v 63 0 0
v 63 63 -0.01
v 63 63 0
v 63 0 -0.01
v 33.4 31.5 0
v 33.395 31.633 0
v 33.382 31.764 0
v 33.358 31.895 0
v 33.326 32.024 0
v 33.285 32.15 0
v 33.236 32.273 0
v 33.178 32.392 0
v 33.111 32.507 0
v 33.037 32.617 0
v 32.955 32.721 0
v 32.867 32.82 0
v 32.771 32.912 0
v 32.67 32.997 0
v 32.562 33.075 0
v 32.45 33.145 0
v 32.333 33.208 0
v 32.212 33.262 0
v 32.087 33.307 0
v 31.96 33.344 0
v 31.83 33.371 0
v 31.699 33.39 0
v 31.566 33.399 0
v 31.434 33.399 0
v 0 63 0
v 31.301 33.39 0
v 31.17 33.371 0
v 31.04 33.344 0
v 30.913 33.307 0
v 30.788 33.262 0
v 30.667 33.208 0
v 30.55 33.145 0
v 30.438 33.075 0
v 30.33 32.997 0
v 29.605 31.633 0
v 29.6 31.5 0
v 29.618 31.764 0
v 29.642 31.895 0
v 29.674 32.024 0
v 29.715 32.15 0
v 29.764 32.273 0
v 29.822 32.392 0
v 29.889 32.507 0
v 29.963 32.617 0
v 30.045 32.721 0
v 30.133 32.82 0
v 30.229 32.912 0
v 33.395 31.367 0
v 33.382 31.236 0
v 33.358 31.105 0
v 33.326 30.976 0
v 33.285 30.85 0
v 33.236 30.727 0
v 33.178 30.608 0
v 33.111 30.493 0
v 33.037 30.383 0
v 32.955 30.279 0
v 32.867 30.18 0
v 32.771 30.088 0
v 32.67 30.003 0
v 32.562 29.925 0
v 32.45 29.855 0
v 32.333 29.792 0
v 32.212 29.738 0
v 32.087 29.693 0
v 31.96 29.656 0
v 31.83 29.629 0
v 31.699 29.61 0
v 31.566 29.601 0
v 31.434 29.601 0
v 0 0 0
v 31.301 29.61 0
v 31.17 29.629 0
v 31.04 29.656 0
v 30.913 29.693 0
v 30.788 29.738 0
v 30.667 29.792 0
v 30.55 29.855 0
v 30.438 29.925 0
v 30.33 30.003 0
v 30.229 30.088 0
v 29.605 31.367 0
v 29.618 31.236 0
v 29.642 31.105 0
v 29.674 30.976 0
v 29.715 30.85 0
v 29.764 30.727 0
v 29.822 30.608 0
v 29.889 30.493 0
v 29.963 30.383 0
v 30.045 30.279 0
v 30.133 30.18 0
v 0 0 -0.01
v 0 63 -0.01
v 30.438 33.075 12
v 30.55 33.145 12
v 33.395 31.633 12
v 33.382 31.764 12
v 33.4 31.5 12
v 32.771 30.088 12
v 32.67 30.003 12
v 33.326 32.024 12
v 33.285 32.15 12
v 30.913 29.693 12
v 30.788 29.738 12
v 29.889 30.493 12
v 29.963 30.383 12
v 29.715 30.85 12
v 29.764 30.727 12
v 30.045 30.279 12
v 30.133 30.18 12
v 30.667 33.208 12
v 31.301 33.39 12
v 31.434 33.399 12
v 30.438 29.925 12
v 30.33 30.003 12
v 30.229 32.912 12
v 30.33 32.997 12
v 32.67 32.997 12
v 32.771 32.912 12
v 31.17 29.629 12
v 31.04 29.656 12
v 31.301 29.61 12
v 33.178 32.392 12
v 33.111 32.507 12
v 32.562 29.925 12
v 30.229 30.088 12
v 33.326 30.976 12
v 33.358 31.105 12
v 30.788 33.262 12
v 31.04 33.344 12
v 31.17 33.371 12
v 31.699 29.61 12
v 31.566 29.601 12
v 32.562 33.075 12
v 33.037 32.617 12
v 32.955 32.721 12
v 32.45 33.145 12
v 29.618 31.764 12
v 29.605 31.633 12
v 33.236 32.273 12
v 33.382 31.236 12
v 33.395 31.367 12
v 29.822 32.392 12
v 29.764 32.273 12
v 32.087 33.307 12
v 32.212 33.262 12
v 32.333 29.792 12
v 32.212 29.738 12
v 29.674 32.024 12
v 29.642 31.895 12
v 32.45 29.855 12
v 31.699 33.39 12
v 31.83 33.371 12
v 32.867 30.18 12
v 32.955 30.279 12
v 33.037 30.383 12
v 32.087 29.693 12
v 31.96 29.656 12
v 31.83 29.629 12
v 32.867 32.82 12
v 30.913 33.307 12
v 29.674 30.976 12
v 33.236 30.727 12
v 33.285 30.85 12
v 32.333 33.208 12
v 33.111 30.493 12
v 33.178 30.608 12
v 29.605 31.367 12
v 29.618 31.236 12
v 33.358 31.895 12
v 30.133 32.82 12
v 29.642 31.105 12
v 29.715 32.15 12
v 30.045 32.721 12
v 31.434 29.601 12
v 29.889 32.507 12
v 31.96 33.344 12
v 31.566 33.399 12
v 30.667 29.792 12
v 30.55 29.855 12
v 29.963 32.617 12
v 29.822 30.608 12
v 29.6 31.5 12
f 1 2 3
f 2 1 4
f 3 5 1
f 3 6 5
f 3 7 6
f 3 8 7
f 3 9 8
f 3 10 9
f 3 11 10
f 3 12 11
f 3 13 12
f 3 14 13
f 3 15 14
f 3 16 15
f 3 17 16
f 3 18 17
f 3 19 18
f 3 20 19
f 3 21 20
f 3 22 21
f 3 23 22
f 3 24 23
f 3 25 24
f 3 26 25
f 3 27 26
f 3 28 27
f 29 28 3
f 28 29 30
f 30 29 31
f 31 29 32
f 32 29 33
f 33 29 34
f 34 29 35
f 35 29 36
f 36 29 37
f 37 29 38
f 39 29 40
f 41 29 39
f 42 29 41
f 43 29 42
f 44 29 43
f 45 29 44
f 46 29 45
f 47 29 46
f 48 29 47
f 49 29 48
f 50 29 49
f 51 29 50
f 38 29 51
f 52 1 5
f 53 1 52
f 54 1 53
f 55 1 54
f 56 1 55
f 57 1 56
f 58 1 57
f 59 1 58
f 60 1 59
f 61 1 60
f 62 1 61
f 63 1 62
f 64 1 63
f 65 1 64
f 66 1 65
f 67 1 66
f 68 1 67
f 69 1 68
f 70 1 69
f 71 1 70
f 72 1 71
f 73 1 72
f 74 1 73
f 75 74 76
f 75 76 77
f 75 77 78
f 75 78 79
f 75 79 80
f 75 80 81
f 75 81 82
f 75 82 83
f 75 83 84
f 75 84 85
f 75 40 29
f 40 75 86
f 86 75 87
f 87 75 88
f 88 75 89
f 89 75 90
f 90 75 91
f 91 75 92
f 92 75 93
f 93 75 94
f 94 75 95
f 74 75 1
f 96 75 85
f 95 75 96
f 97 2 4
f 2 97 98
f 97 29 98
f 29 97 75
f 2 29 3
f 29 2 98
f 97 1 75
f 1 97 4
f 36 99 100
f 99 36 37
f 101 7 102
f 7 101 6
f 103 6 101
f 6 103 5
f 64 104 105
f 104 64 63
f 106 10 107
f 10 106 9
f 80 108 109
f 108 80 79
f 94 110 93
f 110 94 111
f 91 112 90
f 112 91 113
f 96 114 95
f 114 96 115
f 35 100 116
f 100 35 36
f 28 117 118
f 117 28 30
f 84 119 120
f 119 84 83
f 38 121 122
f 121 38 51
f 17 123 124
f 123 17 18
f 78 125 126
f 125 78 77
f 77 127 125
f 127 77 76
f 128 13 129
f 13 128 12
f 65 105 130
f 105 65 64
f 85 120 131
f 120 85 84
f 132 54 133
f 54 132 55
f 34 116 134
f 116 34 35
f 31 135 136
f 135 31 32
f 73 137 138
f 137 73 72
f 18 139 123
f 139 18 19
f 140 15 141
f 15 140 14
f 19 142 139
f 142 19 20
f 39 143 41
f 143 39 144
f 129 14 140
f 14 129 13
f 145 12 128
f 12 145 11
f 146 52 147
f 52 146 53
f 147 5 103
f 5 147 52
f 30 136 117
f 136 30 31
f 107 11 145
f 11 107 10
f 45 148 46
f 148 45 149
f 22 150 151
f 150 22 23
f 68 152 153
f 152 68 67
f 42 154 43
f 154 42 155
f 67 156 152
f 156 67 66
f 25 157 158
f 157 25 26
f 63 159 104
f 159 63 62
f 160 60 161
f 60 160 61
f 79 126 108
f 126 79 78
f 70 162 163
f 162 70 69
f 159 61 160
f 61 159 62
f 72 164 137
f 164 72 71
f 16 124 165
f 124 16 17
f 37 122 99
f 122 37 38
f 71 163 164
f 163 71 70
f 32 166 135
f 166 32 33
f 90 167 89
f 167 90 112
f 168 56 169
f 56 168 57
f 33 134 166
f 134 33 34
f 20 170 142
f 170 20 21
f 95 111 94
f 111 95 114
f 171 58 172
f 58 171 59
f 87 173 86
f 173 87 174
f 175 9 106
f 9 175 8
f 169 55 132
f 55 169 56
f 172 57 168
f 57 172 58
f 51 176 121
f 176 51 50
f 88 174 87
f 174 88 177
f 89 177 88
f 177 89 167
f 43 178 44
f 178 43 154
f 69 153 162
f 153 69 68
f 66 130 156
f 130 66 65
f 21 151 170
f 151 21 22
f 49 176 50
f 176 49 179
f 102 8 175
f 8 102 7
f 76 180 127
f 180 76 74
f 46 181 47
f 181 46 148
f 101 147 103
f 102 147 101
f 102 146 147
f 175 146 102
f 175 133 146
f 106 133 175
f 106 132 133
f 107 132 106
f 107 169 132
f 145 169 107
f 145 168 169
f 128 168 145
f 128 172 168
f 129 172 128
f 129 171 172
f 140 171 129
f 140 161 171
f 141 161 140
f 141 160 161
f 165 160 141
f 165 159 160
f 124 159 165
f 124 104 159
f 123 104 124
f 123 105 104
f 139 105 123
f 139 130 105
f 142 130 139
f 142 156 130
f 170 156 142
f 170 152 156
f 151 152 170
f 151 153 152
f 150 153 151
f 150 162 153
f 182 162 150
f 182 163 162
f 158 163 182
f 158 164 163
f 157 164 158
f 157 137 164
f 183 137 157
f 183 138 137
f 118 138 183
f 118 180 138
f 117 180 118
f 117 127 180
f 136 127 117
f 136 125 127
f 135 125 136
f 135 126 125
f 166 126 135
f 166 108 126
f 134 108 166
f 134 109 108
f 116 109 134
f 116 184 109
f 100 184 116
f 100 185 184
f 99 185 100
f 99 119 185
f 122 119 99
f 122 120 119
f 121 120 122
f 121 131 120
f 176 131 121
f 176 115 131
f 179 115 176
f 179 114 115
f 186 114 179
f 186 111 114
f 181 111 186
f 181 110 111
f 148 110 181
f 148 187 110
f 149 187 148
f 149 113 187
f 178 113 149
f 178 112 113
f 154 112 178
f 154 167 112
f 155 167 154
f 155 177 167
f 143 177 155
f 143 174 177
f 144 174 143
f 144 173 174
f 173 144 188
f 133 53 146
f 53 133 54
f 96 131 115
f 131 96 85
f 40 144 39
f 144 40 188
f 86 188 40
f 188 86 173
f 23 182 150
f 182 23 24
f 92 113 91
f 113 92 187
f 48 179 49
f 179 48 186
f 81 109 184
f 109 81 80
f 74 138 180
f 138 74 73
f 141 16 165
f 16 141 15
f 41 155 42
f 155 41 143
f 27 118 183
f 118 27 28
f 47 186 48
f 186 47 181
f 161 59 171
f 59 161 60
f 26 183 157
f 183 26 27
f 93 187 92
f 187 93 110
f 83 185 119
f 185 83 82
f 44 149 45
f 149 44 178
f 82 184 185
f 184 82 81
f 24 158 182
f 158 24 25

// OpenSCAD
// file: ../Base/Rotation.scad
// Fischertechnik Box Foundation
// Geometry Helpers Rotation

include <PlacementOptions.scad>

// getRotatedSpace(space, rotation=NoRotation)
// Rotates the space dependent on the specified rotation

function getRotatedSpace(space, rotation=NoRotation) = [
    (rotation == Rotate90 || rotation == Rotate270) ? space.y : space.x,
    (rotation == Rotate90 || rotation == Rotate270) ? space.x : space.y
];

// Rotates the given space around the fixed left lower corner
// space = the space the children needs as width/depth list [width,depth]
// rotation = 0 Rotate0 degrees, 1 Rotate90 degrees, 2 Rotate180 degrees, 3 Rotate270 degrees (equivalent to -90)

module RotateFix(space, rotation=NoRotation) {
    dy = (rotation == Rotate0 || rotation == Rotate270) ? 0 :
        (rotation == Rotate90) ? space.x :
        space.y;
    dx = (rotation < Rotate180) ? 0 :
        (rotation == Rotate180) ? space.x :
        space.y;
    
    translate([dx, dy, 0])
        rotate([0, 0, rotations[rotation]])
            children();
}
// file: ../Base/Alignment.scad
// Fischertechnik Box Foundation
// Geometry Helpers Alignment

include <PlacementOptions.scad>

// getAlignedX(elementWidth, spaceWidth, align=AlignRight, offset=0)
// Gets the aligned X offset of an element with the given
// width in the given space.
// elementWidth = The width of the element to positon
// spaceWidth = The space where the element should be aligned
// align = 0 AlignLeft, 1 AlignCenter, 2 AlignRight
// offset = an optional offset from the aligned position. When
// aligned left or centered, then positive values are in X direction.
// When aligned right then positive values are in negative X direction.

function getAlignedX(elementWidth, spaceWidth, align=AlignRight, offset=0) =
    (align == AlignLeft) ?
        offset :
        ((align == AlignCenter) ?
        (spaceWidth - elementWidth)/2 + offset :
        spaceWidth - offset - elementWidth);

// getAlignedY(elementDepth, spaceDepth, align=AlignTop, offset=0)
// Gets the aligned Y offset of an element with the given
// depth in the given space.
// elementDepth = The depth of the element to positon
// spaceDepth = The space where the element should be aligned
// align = 0 AlignBottom, 1 AlignCenter, 2 AlignTop
// offset = an optional offset from the aligned position. When
// aligned bottom or centered, then positive values are in Y direction.
// When aligned top then positive values are in negative Y direction.

function getAlignedY(elementDepth, spaceDepth, align=AlignTop, offset=0) =
    (align == AlignBottom) ?
        offset :
        ((align == AlignCenter) ?
        (spaceDepth - elementDepth)/2 + offset :
        spaceDepth - offset - elementDepth);
// file: ../Base/PlacementOptions.scad
// Fischertechnik Box Foundation
// Placement Options

// Alignment
NoAlign = 0;
AlignLeft = 1;
AlignBottom = 2;
AlignCenter = 3;
AlignRight = 4;
AlignTop = 5;

// Element rotation degree steps
rotations = [0, -90, -180, -270];

// Rotation
NoRotation = 0;
Rotate0 = 0;
Rotate90 = 1;
Rotate180 = 2;
Rotate270 = 3;

// Docking (seen from above)
NoDock = -1;
DockLeft = 0;
DockTop = 1;
DockRight = 2;
DockCorner = 2;
DockBottom = 3;

// Web corners
LowerLeft = 0;
UpperLeft = 1;
UpperRight = 2;
LowerRight = 3;

// Web position relative to corner
LeftOfCorner = 0;
RightOfCorner = 1;
// file: ../Base/Boxes.scad
// Fischertechnik Box Foundation
// Pre-designed Boxes

use <Constants.scad>

include <PlacementOptions.scad>

box190Width = 190;
box190Depth = 130;
box130Width = 130;
box130Depth = 95;

// Values are from an original ec3 box
topBottomDifference = 1.5;
outerHeight = 40;
innerHeight = 38.2;
baseThickness = outerHeight - innerHeight;
stackExcess = 5.7;
radius = 3.5;
wallThickness = 1.5;
tolerance = 0.2;
stackOffset = innerHeight - stackExcess;

boxUsageHeight = stackOffset;
boxWallThickness = wallThickness;
boxBaseThickness = baseThickness;
boxWebWidth = 3.0;

// getBoxWallThickness()
// Gets the wall thickness of a Fischertechnik Box
function getBoxWallThickness() = boxWallThickness;

// getBoxUsageHeight()
// Gets the usable height of a Fischertechnik box
function getBoxUsageHeight() = boxUsageHeight;

// getBoxInnerHeight()
// Gets the inner height of a Fischertechnik box, including the stack excess
function getBoxInnerHeight() = innerHeight;

// getBoxBaseThickness()
// Gets the thickness of the Fischertechnik box base.
function getBoxBaseThickness() = boxBaseThickness;

// getBoxWebWidth()
// Gets the width of a box web
function getBoxWebWidth() = boxWebWidth;

// getBox190Space()
// Gets the usable inner space of a Box 190 as an x/y-list
function getBox190Space() = [
    box190Width - 2*getBoxWallThickness() - topBottomDifference, 
    box190Depth - 2*getBoxWallThickness() - topBottomDifference ];

// BoxBase(width, depth)
// Creates an empty stackable Fischertechnik compatible box
// width = Outer width of the box (190, 130, ...)
// depth = Outer depth of the box (130, 95, ...)

module BoxBase(width, depth, height=outerHeight) {    
    thinPlate = 0.01;

    innerHeight = height - baseThickness;    
    
    module BodyPlate(width, depth) {
        translate([radius, radius])
        hull() {
            w = width-2*radius;
            d = depth-2*radius;
            cube([w, d, thinPlate]);
            cylinder(thinPlate, r=radius, $fn=getFragments());
            translate([w, 0])
                cylinder(thinPlate, r=radius, $fn=getFragments());
            translate([w, d])
                cylinder(thinPlate, r=radius, $fn=getFragments());
            translate([0, d])
                cylinder(thinPlate, r=radius, $fn=getFragments());
        }
    }
    
    module Body(tolerance=tolerance) {
        hull() {
            // Bottom with tolerance to fit into the original boxes when stacked
            translate([-wallThickness+tolerance, -wallThickness+tolerance, -baseThickness])
                BodyPlate(width-topBottomDifference-2*tolerance, depth-topBottomDifference-2*tolerance);
            
            // Top
            translate([-wallThickness-topBottomDifference/2, -wallThickness-topBottomDifference/2, innerHeight-thinPlate])
                BodyPlate(width, depth);
         }
    }

    module Cutoff() {
        hull() {
            coWidth = width - 2*wallThickness;
            coDepth = depth - 2*wallThickness;
            
            // Bottom
            BodyPlate(coWidth-topBottomDifference, coDepth-topBottomDifference);

            // Top
            translate([-topBottomDifference/2, -topBottomDifference/2, innerHeight+thinPlate]) 
                BodyPlate(coWidth, coDepth);
        }
    }
    
    difference() {        
        Body();
        Cutoff();
        stackOffset = innerHeight - stackExcess;
        translate([0, 0, stackOffset + baseThickness])
            Body(tolerance=0);
    }
}

// Creates the Fischertechnik empty box 130x190 mm and places it at position 0,0
// 190x130 are the outer sizes, the inner space is slightly smaller. Use getBox190Space() to get the inner sizes.
// The box is positioned that the usable inner space is at the 0,0,0 position. The

module Box190() {
    BoxBase(box190Width, box190Depth);
}

// Gets the usable inner space of a Box 130 as an x/y-list
function getBox130Space() = [
    box130Width - 2*getBoxWallThickness() - topBottomDifference, 
    box130Depth - 2*getBoxWallThickness() - topBottomDifference ];

// Creates the Fischertechnik empty box 95x130 mm and places it at position 0,0
// 190x130 are the outer sizes, the inner space is slightly smaller. Use getBox190Space() to get the inner sizes.
// The box is positioned that the usable inner space is at the 0,0,0 position. The

module Box130() {
    BoxBase(box130Width, box130Depth);
}

// Creates a web at the specified box walls
// corner 0 = LowerLeft, 1 = UpperLeft, 2 = UpperRight, 3 = LowerRight
// side 0 = LeftOfCorner, 1 = RightOfCorner
// distance = Distance in mm from the corner
// boxSpace = inner width and depth of the box (default: Box 190)
// webWidth = length of the web (default is 3 mms)
// webThickness = thickness of the web (default is 1 mm)

module BoxWeb(corner, side, distance, boxSpace=getBox190Space(), webWidth=getBoxWebWidth(), webThickness=1.0) {
    sink = getBoxWallThickness()/2;

    width = (corner % 2 == 0) ? 
            (side == LeftOfCorner ? webWidth : webThickness) :
            (side == LeftOfCorner ? webThickness : webWidth);

    depth = (corner % 2 == 0) ? 
            (side == RightOfCorner ? webWidth : webThickness) :
            (side == RightOfCorner ? webThickness : webWidth);
    
    xDiff = corner == LowerLeft ? 
                (side == LeftOfCorner ? -sink : distance) :
            (corner == UpperLeft ?                
                (side == LeftOfCorner ? distance : -sink) :
            (corner == UpperRight ?
                (side == LeftOfCorner ? boxSpace.x-webWidth+sink : boxSpace.x-distance-webThickness) :
                (side == LeftOfCorner ? boxSpace.x-distance-webThickness: boxSpace.x-webWidth+sink)));

    yDiff = corner == LowerLeft ? 
                (side == RightOfCorner ? -sink : distance) :
            (corner == UpperLeft ?
                (side == RightOfCorner ? boxSpace.y-distance : boxSpace.y-webWidth+sink) :
            (corner == UpperRight ?
                (side == RightOfCorner ? boxSpace.y-webWidth+sink : boxSpace.y-distance) :
                (side == RightOfCorner ? distance : -sink)));
    
    translate([xDiff, yDiff, -getExcess()])
        cube([width, depth, boxUsageHeight + 2*getExcess()]);
}
// file: ../Base/Placement.scad
// Fischertechnik Box Foundation
// Geometry Helpers Placement

use <Constants.scad>
use <Alignment.scad>
use <Rotation.scad>
use <Boxes.scad>

include <PlacementOptions.scad>

// Place(x=0, y=0, elementSpace=[0,0], alignX=AlignLeft, alignY=AlignBottom, rotation=Rotate0, boxSpace=getBox190Space())
// Places the child at the specified position
// y = Y-Position. This is a relative position when an X aligment is specified.
// x = X-Position. This is a relative position when an Y aligment is specified.
// elementSpace = space of the element to be placed [x,y]
// alignX = -1=NoAlign, 0 AlignLeft, 1 AlignCenter, 3 AlignRight (elementSpace and boxSpace required!)
// alignY = -1=NoAlign, 2 AlignBottom, 1 AlignCenter, 4 AlignTop (elementSpace and boxSpace required!)
// rotation = 0 Rotate0 0 degrees, 1 Rotate90 90 degrees, 
// 2 Rotate180 180 degrees, 3 Rotate270 270 degrees (equivalent to -90)
// boxSpace = Inner space of the box where the placement occurs [x,y] - default is Box 190x130 inner space

module Place(x=0, y=0, elementSpace=[0,0], 
  alignX=AlignLeft, alignY=AlignBottom, 
  rotation=NoRotation, boxSpace=getBox190Space()) {

    module Position(x, y, space, rotation=Rotate0) {
        translate([x, y, 0])
            RotateFix(space, rotation)
                children();
    }

    space = getRotatedSpace(elementSpace, rotation);
    alignedX = getAlignedX(space.x, boxSpace.x, alignX, x);
    alignedY = getAlignedY(space.y, boxSpace.y, alignY, y);
    Position(alignedX, alignedY, elementSpace, rotation)
        children();
}

// Center(space=getBox130Space(), elementSpace=[0,0])
// space = Space where the children is centered. For cylinder use centered=true and no elementSpace.
// elementSpace = space of the element to be centered [x,y]

module Center(space=getBox190Space(), elementSpace=[0,0]) {
    Place(elementSpace=elementSpace, boxSpace=space, alignX=AlignCenter, alignY=AlignCenter)
        children();
}

// CenterHorizontal(width=0, y=0, offset=0, space=getBox130Space())
// width = Width of the element to be placed.
// y = Y position of the element
// offset = Offset from the center position (negative will be left of the center)
// space = Space where the element is placed

module CenterHorizontal(width=0, y=0, offset=0, space=getBox190Space()) {
    Place(x=offset, y=y, elementSpace=[width, 0], boxSpace=space, alignX=AlignCenter)
        children(0);
}

// CenterVertical(depth=0, x=0, offset=0, space=getBox130Space())
// depth = Depth of the element to be placed.
// x = X position of the element
// offset = Offset from the center position (negative will be down of the center)
// space = Space where the element is placed

module CenterVertical(depth=0, x=0, offset=0, space=getBox190Space()) {
    Place(x=x, y=offset, elementSpace=[0, depth], boxSpace=space, alignY=AlignCenter)
        children(0);
}

// getIsVertical(align)
// True if the specified alignment needs a vertical orientation for a divider (AlignRight, AlignLeft)

function getIsVertical(align) = (align == AlignRight || align == AlignLeft);

// getIsHorizontal(align)
// True if the specified alignment needs a horizontal orientation for a divider (AlignTop, AlignBottom)

function getIsHorizontal(align) = (align == AlignTop || align == AlignBottom);
// file: ../Base/Constants.scad
// Fischertechnik Box Foundation
// Constants

// Constant values necessary for multiple elements

// Base constants
dividerThickness = 1.2;
excess = 0.01;
fragments = 90;
tolerance = 0.8;

// Gets the thickness of a divider 
function getDividerThickness() = dividerThickness;

// Gets the excess that is used to merge walls into each other
function getExcess() = excess;

// Gets amount of fragments of a cylinder
function getFragments() = fragments;

// Gets the inner tolerance of a frame to each side
function getTolerance() = tolerance;


// Fischertechnik specific constants
axisDiameter = 4;
axisBottomDiameter = axisDiameter + 1;
axisTolerance = 0.2;

// Gets axis diameter of Fischertechnik axis
function getAxisDiameter() = axisDiameter;

// Gets axis diameter tolerance (subtracted for element axis)
function getAxisTolerance() = axisTolerance;

// Gets the axis diameter for standing axis
function getStandAxisDiameter() = getAxisDiameter() - getAxisTolerance();

// Gets axis bottom diameter for thicker part at the bottom
function getAxisBottomDiameter() = axisBottomDiameter;

standardEdgeDistance = 2.5;
standardWebDistance = 11.5;
standardCornerLength = 15;

// gets the standard distance to the wall of the box for dockable frames with webs
function getStandardEdgeDistance() = standardEdgeDistance;

// gets the standard distance of each web to the corner of the dockable frame
function getStandardWebDistance() = standardWebDistance;

// gets the standard length of the corner walls of a dockable frame
function getStandardCornerLength() = standardCornerLength;

tubeWallFactor = 0.8;

// gets the wall thickness of a tube.
function getTubeWallThickness() = tubeWallFactor * getDividerThickness();

smallPartsFrameHeight = 20;

// gets the frame height for docked small parts boxes.
function getSmallPartsFrameHeight() = smallPartsFrameHeight;

hubRingDiameter = 19.5;
hubRingLevelDiameter = 21;

// gets the diameter of a tube matching the inner ring of a wheel
function getHubRingDiameter() = hubRingDiameter;

// gets the diameter of a hub tube with a thicker diameter
function getHubRingLevelDiameter() = hubRingLevelDiameter;
// main file
// Fischertechnik Box Library
// Axis for gear wheel Z40 with flat hub
// 31022, 31015

use <../ModelBase/Simple.scad>
use <../Base/Constants.scad>

/* [Hidden] */
width = 63;
depth = 63;
height = 12;

// getAxisFlatHubWithGearZ40Space()
// Gets the space of an axis for a gear wheel with Z40

function getAxisFlatHubWithGearZ40Space() = [width, depth, height];

// AxisFlatHubWithGearZ40()
// Axis for gear Z40 with flat hub

module AxisFlatHubWithGearZ40() {
    AxisWithSpace(height, getAxisFlatHubWithGearZ40Space());
}

// Test
color("lightgray")
AxisFlatHubWithGearZ40();
